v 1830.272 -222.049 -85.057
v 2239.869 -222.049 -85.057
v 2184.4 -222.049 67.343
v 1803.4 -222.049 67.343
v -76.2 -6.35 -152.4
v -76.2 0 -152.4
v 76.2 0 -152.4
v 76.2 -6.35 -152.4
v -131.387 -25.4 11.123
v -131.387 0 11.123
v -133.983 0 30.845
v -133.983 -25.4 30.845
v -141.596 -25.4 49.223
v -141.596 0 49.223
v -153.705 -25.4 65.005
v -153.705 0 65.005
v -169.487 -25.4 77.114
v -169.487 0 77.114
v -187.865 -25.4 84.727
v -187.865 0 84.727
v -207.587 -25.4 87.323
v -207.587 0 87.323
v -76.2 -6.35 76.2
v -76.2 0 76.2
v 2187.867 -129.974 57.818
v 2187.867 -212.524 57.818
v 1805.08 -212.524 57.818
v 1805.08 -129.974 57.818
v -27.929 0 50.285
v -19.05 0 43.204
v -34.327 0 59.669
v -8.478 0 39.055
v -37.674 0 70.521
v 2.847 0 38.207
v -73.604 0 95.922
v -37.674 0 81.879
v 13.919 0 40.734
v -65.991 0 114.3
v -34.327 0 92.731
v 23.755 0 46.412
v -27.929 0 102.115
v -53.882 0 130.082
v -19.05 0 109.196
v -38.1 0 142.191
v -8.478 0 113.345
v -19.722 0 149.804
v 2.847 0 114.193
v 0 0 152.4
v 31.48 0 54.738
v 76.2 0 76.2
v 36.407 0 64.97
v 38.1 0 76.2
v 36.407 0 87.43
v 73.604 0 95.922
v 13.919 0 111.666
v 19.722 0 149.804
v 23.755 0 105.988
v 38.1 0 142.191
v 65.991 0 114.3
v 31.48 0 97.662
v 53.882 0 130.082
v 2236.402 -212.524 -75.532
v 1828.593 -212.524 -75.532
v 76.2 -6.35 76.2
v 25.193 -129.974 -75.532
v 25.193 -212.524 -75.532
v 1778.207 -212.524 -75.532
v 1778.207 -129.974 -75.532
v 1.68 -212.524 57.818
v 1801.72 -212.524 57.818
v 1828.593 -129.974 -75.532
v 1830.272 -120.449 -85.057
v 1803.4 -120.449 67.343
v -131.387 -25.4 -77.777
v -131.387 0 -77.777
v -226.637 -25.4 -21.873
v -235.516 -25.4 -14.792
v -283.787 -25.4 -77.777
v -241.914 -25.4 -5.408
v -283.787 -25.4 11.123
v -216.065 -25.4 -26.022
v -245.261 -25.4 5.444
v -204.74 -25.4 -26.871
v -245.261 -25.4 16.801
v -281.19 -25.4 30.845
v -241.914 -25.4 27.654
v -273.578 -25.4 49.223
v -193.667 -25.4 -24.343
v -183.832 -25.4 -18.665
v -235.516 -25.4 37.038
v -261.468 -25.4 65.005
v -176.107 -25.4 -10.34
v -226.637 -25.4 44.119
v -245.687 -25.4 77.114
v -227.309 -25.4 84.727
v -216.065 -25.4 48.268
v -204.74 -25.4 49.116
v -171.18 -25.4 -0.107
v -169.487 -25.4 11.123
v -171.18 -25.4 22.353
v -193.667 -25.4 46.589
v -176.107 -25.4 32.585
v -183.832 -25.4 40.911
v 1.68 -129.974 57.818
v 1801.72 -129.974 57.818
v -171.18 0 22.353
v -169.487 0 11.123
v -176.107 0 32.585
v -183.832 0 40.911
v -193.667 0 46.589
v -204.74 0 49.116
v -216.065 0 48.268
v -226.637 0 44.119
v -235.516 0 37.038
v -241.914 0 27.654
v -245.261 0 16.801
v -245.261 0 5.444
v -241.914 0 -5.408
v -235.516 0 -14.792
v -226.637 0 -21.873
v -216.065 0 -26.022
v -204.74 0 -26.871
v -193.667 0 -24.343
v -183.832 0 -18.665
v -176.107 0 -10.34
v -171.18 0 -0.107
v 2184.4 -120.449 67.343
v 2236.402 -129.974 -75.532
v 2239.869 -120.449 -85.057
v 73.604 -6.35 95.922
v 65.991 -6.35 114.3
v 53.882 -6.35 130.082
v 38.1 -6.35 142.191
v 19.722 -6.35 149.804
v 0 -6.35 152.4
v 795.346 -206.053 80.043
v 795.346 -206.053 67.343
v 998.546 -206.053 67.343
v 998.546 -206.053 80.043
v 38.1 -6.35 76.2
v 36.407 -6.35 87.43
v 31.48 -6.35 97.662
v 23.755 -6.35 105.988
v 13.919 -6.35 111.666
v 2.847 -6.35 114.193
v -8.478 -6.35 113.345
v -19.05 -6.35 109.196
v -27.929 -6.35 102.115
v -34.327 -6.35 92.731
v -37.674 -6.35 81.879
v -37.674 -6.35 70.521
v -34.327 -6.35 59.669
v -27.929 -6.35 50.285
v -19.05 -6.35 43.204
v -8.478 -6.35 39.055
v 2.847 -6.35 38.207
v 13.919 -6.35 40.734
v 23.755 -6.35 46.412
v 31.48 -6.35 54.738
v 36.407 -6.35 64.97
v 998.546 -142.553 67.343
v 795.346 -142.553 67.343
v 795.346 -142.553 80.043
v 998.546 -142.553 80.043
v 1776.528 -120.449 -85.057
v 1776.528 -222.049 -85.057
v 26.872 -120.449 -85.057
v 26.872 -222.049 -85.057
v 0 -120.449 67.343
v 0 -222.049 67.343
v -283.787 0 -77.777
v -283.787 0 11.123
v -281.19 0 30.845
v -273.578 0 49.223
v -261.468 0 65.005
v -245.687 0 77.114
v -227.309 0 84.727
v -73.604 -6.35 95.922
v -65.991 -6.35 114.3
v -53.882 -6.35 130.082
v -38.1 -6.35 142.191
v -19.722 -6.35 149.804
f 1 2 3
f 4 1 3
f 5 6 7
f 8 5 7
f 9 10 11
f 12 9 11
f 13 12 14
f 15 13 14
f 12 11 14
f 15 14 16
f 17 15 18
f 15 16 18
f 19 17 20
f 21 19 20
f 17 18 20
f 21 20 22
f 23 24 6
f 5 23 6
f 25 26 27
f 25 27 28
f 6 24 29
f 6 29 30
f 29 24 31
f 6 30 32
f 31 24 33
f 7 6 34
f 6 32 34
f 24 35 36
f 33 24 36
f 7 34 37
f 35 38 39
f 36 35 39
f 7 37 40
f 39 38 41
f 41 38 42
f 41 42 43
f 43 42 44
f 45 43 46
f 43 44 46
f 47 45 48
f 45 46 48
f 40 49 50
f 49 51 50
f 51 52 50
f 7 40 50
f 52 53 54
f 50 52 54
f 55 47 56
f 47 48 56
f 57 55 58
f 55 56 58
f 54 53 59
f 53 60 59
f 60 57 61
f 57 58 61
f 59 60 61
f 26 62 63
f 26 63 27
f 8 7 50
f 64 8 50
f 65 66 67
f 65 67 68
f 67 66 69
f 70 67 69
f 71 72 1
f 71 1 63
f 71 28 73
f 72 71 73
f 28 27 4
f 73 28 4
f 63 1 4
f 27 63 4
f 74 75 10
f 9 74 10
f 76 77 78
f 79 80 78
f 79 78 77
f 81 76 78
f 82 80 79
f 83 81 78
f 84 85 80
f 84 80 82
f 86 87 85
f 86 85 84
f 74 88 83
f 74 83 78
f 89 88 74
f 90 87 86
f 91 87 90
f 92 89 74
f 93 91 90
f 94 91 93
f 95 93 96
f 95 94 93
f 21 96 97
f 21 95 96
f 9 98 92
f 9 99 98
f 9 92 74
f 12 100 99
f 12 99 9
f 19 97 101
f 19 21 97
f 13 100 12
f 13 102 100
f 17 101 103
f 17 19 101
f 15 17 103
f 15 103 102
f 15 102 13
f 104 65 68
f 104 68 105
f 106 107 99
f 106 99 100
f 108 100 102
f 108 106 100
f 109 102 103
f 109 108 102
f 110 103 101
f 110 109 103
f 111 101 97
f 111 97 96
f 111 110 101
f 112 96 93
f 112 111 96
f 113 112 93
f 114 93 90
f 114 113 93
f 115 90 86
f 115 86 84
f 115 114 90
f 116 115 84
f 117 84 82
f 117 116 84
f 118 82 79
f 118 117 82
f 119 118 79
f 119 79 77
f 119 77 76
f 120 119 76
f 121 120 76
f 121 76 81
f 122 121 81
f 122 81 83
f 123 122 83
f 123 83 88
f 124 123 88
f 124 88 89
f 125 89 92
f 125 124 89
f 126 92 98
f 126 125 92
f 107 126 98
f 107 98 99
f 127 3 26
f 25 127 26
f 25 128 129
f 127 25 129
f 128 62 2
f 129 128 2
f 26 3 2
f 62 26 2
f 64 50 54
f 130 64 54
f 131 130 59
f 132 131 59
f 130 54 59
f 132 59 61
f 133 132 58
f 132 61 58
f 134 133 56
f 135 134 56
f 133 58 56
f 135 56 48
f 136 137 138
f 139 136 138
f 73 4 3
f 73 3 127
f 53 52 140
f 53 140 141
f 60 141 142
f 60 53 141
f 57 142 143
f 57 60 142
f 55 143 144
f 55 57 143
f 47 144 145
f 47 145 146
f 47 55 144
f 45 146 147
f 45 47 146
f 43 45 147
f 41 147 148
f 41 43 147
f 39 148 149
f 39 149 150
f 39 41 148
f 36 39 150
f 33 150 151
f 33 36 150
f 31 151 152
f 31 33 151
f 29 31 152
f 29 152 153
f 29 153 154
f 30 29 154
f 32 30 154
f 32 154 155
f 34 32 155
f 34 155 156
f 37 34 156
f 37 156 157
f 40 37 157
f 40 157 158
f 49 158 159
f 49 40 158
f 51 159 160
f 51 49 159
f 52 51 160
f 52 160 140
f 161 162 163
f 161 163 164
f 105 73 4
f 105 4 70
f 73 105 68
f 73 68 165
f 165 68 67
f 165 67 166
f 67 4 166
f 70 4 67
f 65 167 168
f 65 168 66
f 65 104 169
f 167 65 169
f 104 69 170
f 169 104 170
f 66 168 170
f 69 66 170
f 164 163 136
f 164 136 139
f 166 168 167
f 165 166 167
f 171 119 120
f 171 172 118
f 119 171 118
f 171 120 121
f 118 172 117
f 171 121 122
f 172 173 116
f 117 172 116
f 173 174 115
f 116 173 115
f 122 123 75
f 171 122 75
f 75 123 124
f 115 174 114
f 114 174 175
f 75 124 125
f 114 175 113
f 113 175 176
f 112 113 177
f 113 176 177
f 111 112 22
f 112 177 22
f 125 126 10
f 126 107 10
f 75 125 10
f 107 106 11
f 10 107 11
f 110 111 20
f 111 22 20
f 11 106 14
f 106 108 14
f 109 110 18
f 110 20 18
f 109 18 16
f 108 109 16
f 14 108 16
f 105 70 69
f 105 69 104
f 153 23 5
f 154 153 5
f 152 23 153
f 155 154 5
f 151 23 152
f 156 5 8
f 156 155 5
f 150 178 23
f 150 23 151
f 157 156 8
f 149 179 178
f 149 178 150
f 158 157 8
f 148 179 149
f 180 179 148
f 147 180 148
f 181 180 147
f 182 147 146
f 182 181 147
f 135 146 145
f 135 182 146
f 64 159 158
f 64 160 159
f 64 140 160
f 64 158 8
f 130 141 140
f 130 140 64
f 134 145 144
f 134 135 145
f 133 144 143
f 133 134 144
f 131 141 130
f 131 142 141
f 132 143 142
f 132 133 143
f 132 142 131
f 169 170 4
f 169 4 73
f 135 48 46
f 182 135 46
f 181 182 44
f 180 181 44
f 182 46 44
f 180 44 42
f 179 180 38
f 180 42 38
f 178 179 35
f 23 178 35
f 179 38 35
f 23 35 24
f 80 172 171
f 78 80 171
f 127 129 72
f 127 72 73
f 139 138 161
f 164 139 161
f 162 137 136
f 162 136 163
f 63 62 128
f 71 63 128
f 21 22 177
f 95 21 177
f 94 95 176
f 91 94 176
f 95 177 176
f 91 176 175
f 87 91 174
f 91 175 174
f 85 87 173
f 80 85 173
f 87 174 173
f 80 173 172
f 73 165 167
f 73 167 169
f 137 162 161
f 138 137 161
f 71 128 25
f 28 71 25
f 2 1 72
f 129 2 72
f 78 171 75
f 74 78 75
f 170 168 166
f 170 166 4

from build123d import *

# Parameters (mm, degrees)
F0_R      = 38.1
F1_DEPTH  = 6.35
F2_R      = 38.1
F3_DEPTH  = 25.4
F4_W      = 101.6
F4_H      = 152.4
F4_W_2    = 82.55
F4_H_2    = 133.35
F5_DEPTH  = 1803.4
F6_DEPTH  = 508
F8_DEPTH  = 222.0496700535
F10_DEPTH = 222.0496700535
F11_W     = 203.2
F11_H     = 63.5
F12_DEPTH = 12.7


with BuildPart() as f1:
    # F0 (on Front) → F1 (new body)
    with BuildSketch(Plane.XZ):
        with BuildLine():
            Line((-76.2, -152.4), (76.2, -152.4))
            Line((76.2, -152.4), (76.2, 76.2))
            ThreePointArc((76.2, 76.2), (53.8815367264, 130.0815367264), (0, 152.4))
            ThreePointArc((0, 152.4), (-53.8815367264, 130.0815367264), (-76.2, 76.2))
            Line((-76.2, 76.2), (-76.2, -152.4))
        make_face()
        with Locations((0, 76.2)):
            Circle(F0_R, mode=Mode.SUBTRACT)
    extrude(amount=F1_DEPTH)


with BuildPart() as f3:
    # F2 (on Front) → F3 (new body)
    with BuildSketch(Plane.XZ):
        with BuildLine():
            Line((-283.7868928909, -77.7770355344), (-131.3868928909, -77.7770355344))
            Line((-131.3868928909, -77.7770355344), (-131.3868928909, 11.1229644656))
            ThreePointArc((-131.3868928909, 11.1229644656), (-153.7053561645, 65.004501192), (-207.5868928909, 87.3229644656))
            ThreePointArc((-207.5868928909, 87.3229644656), (-261.4684296173, 65.004501192), (-283.7868928909, 11.1229644656))
            Line((-283.7868928909, 11.1229644656), (-283.7868928909, -77.7770355344))
        make_face()
        with Locations((-207.5868928909, 11.1229644656)):
            Circle(F2_R, mode=Mode.SUBTRACT)
    extrude(amount=F3_DEPTH)


with BuildPart() as f5:
    # F4 (on Right) → F5 (new body)
    with BuildSketch(Plane.YZ):
        with Locations((-171.2486700535, -8.8574821234)):
            Rectangle(F4_W, F4_H)
        with Locations((-171.2486700535, -8.8574821234)):
            Rectangle(F4_W_2, F4_H_2, mode=Mode.SUBTRACT)
    extrude(amount=F5_DEPTH)


with BuildPart() as f6:
    # F6 (new): a face of the model
    f6_faces = [f5.part.faces().sort_by_distance(p)[0] for p in [
        (1803.4, -220.2170500055, -8.8574821234),
    ]]
    extrude(f6_faces, amount=F6_DEPTH)

    # F7 (on face) → F8 (cut, through all)
    with BuildSketch(Plane.XZ.offset(222.0486700535)):
        Polygon((1830.27223186, -85.0574821234), (1803.4, 67.3425178766), (1803.4, -85.0574821234), align=None)
        Polygon((2311.4, 67.3425178766), (2184.4, 67.3425178766), (2239.8690637022, -85.0574821234), (2311.4, -85.0574821234), align=None)
    extrude(amount=-F8_DEPTH, mode=Mode.SUBTRACT)


with BuildPart() as f5_1:
    add(f5.part)

    # F9 (on face) → F10 (cut, through all)
    with BuildSketch(Plane.XZ.offset(222.0486700535)):
        Polygon((26.87223186, -85.0574821234), (0, 67.3425178766), (0, -85.0574821234), align=None)
        Polygon((1803.4, -85.0574821234), (1803.4, 67.3425178766), (1776.52776814, -85.0574821234), align=None)
    extrude(amount=-F10_DEPTH, mode=Mode.SUBTRACT)


with BuildPart() as f12:
    # F11 (on face) → F12 (new body)
    with BuildSketch(Plane.XY.offset(67.3425178766)):
        with Locations((896.9457658768, -174.3025566339)):
            Rectangle(F11_W, F11_H)
    extrude(amount=F12_DEPTH)


solid = Compound([f1.part, f3.part, f6.part, f5_1.part, f12.part])
